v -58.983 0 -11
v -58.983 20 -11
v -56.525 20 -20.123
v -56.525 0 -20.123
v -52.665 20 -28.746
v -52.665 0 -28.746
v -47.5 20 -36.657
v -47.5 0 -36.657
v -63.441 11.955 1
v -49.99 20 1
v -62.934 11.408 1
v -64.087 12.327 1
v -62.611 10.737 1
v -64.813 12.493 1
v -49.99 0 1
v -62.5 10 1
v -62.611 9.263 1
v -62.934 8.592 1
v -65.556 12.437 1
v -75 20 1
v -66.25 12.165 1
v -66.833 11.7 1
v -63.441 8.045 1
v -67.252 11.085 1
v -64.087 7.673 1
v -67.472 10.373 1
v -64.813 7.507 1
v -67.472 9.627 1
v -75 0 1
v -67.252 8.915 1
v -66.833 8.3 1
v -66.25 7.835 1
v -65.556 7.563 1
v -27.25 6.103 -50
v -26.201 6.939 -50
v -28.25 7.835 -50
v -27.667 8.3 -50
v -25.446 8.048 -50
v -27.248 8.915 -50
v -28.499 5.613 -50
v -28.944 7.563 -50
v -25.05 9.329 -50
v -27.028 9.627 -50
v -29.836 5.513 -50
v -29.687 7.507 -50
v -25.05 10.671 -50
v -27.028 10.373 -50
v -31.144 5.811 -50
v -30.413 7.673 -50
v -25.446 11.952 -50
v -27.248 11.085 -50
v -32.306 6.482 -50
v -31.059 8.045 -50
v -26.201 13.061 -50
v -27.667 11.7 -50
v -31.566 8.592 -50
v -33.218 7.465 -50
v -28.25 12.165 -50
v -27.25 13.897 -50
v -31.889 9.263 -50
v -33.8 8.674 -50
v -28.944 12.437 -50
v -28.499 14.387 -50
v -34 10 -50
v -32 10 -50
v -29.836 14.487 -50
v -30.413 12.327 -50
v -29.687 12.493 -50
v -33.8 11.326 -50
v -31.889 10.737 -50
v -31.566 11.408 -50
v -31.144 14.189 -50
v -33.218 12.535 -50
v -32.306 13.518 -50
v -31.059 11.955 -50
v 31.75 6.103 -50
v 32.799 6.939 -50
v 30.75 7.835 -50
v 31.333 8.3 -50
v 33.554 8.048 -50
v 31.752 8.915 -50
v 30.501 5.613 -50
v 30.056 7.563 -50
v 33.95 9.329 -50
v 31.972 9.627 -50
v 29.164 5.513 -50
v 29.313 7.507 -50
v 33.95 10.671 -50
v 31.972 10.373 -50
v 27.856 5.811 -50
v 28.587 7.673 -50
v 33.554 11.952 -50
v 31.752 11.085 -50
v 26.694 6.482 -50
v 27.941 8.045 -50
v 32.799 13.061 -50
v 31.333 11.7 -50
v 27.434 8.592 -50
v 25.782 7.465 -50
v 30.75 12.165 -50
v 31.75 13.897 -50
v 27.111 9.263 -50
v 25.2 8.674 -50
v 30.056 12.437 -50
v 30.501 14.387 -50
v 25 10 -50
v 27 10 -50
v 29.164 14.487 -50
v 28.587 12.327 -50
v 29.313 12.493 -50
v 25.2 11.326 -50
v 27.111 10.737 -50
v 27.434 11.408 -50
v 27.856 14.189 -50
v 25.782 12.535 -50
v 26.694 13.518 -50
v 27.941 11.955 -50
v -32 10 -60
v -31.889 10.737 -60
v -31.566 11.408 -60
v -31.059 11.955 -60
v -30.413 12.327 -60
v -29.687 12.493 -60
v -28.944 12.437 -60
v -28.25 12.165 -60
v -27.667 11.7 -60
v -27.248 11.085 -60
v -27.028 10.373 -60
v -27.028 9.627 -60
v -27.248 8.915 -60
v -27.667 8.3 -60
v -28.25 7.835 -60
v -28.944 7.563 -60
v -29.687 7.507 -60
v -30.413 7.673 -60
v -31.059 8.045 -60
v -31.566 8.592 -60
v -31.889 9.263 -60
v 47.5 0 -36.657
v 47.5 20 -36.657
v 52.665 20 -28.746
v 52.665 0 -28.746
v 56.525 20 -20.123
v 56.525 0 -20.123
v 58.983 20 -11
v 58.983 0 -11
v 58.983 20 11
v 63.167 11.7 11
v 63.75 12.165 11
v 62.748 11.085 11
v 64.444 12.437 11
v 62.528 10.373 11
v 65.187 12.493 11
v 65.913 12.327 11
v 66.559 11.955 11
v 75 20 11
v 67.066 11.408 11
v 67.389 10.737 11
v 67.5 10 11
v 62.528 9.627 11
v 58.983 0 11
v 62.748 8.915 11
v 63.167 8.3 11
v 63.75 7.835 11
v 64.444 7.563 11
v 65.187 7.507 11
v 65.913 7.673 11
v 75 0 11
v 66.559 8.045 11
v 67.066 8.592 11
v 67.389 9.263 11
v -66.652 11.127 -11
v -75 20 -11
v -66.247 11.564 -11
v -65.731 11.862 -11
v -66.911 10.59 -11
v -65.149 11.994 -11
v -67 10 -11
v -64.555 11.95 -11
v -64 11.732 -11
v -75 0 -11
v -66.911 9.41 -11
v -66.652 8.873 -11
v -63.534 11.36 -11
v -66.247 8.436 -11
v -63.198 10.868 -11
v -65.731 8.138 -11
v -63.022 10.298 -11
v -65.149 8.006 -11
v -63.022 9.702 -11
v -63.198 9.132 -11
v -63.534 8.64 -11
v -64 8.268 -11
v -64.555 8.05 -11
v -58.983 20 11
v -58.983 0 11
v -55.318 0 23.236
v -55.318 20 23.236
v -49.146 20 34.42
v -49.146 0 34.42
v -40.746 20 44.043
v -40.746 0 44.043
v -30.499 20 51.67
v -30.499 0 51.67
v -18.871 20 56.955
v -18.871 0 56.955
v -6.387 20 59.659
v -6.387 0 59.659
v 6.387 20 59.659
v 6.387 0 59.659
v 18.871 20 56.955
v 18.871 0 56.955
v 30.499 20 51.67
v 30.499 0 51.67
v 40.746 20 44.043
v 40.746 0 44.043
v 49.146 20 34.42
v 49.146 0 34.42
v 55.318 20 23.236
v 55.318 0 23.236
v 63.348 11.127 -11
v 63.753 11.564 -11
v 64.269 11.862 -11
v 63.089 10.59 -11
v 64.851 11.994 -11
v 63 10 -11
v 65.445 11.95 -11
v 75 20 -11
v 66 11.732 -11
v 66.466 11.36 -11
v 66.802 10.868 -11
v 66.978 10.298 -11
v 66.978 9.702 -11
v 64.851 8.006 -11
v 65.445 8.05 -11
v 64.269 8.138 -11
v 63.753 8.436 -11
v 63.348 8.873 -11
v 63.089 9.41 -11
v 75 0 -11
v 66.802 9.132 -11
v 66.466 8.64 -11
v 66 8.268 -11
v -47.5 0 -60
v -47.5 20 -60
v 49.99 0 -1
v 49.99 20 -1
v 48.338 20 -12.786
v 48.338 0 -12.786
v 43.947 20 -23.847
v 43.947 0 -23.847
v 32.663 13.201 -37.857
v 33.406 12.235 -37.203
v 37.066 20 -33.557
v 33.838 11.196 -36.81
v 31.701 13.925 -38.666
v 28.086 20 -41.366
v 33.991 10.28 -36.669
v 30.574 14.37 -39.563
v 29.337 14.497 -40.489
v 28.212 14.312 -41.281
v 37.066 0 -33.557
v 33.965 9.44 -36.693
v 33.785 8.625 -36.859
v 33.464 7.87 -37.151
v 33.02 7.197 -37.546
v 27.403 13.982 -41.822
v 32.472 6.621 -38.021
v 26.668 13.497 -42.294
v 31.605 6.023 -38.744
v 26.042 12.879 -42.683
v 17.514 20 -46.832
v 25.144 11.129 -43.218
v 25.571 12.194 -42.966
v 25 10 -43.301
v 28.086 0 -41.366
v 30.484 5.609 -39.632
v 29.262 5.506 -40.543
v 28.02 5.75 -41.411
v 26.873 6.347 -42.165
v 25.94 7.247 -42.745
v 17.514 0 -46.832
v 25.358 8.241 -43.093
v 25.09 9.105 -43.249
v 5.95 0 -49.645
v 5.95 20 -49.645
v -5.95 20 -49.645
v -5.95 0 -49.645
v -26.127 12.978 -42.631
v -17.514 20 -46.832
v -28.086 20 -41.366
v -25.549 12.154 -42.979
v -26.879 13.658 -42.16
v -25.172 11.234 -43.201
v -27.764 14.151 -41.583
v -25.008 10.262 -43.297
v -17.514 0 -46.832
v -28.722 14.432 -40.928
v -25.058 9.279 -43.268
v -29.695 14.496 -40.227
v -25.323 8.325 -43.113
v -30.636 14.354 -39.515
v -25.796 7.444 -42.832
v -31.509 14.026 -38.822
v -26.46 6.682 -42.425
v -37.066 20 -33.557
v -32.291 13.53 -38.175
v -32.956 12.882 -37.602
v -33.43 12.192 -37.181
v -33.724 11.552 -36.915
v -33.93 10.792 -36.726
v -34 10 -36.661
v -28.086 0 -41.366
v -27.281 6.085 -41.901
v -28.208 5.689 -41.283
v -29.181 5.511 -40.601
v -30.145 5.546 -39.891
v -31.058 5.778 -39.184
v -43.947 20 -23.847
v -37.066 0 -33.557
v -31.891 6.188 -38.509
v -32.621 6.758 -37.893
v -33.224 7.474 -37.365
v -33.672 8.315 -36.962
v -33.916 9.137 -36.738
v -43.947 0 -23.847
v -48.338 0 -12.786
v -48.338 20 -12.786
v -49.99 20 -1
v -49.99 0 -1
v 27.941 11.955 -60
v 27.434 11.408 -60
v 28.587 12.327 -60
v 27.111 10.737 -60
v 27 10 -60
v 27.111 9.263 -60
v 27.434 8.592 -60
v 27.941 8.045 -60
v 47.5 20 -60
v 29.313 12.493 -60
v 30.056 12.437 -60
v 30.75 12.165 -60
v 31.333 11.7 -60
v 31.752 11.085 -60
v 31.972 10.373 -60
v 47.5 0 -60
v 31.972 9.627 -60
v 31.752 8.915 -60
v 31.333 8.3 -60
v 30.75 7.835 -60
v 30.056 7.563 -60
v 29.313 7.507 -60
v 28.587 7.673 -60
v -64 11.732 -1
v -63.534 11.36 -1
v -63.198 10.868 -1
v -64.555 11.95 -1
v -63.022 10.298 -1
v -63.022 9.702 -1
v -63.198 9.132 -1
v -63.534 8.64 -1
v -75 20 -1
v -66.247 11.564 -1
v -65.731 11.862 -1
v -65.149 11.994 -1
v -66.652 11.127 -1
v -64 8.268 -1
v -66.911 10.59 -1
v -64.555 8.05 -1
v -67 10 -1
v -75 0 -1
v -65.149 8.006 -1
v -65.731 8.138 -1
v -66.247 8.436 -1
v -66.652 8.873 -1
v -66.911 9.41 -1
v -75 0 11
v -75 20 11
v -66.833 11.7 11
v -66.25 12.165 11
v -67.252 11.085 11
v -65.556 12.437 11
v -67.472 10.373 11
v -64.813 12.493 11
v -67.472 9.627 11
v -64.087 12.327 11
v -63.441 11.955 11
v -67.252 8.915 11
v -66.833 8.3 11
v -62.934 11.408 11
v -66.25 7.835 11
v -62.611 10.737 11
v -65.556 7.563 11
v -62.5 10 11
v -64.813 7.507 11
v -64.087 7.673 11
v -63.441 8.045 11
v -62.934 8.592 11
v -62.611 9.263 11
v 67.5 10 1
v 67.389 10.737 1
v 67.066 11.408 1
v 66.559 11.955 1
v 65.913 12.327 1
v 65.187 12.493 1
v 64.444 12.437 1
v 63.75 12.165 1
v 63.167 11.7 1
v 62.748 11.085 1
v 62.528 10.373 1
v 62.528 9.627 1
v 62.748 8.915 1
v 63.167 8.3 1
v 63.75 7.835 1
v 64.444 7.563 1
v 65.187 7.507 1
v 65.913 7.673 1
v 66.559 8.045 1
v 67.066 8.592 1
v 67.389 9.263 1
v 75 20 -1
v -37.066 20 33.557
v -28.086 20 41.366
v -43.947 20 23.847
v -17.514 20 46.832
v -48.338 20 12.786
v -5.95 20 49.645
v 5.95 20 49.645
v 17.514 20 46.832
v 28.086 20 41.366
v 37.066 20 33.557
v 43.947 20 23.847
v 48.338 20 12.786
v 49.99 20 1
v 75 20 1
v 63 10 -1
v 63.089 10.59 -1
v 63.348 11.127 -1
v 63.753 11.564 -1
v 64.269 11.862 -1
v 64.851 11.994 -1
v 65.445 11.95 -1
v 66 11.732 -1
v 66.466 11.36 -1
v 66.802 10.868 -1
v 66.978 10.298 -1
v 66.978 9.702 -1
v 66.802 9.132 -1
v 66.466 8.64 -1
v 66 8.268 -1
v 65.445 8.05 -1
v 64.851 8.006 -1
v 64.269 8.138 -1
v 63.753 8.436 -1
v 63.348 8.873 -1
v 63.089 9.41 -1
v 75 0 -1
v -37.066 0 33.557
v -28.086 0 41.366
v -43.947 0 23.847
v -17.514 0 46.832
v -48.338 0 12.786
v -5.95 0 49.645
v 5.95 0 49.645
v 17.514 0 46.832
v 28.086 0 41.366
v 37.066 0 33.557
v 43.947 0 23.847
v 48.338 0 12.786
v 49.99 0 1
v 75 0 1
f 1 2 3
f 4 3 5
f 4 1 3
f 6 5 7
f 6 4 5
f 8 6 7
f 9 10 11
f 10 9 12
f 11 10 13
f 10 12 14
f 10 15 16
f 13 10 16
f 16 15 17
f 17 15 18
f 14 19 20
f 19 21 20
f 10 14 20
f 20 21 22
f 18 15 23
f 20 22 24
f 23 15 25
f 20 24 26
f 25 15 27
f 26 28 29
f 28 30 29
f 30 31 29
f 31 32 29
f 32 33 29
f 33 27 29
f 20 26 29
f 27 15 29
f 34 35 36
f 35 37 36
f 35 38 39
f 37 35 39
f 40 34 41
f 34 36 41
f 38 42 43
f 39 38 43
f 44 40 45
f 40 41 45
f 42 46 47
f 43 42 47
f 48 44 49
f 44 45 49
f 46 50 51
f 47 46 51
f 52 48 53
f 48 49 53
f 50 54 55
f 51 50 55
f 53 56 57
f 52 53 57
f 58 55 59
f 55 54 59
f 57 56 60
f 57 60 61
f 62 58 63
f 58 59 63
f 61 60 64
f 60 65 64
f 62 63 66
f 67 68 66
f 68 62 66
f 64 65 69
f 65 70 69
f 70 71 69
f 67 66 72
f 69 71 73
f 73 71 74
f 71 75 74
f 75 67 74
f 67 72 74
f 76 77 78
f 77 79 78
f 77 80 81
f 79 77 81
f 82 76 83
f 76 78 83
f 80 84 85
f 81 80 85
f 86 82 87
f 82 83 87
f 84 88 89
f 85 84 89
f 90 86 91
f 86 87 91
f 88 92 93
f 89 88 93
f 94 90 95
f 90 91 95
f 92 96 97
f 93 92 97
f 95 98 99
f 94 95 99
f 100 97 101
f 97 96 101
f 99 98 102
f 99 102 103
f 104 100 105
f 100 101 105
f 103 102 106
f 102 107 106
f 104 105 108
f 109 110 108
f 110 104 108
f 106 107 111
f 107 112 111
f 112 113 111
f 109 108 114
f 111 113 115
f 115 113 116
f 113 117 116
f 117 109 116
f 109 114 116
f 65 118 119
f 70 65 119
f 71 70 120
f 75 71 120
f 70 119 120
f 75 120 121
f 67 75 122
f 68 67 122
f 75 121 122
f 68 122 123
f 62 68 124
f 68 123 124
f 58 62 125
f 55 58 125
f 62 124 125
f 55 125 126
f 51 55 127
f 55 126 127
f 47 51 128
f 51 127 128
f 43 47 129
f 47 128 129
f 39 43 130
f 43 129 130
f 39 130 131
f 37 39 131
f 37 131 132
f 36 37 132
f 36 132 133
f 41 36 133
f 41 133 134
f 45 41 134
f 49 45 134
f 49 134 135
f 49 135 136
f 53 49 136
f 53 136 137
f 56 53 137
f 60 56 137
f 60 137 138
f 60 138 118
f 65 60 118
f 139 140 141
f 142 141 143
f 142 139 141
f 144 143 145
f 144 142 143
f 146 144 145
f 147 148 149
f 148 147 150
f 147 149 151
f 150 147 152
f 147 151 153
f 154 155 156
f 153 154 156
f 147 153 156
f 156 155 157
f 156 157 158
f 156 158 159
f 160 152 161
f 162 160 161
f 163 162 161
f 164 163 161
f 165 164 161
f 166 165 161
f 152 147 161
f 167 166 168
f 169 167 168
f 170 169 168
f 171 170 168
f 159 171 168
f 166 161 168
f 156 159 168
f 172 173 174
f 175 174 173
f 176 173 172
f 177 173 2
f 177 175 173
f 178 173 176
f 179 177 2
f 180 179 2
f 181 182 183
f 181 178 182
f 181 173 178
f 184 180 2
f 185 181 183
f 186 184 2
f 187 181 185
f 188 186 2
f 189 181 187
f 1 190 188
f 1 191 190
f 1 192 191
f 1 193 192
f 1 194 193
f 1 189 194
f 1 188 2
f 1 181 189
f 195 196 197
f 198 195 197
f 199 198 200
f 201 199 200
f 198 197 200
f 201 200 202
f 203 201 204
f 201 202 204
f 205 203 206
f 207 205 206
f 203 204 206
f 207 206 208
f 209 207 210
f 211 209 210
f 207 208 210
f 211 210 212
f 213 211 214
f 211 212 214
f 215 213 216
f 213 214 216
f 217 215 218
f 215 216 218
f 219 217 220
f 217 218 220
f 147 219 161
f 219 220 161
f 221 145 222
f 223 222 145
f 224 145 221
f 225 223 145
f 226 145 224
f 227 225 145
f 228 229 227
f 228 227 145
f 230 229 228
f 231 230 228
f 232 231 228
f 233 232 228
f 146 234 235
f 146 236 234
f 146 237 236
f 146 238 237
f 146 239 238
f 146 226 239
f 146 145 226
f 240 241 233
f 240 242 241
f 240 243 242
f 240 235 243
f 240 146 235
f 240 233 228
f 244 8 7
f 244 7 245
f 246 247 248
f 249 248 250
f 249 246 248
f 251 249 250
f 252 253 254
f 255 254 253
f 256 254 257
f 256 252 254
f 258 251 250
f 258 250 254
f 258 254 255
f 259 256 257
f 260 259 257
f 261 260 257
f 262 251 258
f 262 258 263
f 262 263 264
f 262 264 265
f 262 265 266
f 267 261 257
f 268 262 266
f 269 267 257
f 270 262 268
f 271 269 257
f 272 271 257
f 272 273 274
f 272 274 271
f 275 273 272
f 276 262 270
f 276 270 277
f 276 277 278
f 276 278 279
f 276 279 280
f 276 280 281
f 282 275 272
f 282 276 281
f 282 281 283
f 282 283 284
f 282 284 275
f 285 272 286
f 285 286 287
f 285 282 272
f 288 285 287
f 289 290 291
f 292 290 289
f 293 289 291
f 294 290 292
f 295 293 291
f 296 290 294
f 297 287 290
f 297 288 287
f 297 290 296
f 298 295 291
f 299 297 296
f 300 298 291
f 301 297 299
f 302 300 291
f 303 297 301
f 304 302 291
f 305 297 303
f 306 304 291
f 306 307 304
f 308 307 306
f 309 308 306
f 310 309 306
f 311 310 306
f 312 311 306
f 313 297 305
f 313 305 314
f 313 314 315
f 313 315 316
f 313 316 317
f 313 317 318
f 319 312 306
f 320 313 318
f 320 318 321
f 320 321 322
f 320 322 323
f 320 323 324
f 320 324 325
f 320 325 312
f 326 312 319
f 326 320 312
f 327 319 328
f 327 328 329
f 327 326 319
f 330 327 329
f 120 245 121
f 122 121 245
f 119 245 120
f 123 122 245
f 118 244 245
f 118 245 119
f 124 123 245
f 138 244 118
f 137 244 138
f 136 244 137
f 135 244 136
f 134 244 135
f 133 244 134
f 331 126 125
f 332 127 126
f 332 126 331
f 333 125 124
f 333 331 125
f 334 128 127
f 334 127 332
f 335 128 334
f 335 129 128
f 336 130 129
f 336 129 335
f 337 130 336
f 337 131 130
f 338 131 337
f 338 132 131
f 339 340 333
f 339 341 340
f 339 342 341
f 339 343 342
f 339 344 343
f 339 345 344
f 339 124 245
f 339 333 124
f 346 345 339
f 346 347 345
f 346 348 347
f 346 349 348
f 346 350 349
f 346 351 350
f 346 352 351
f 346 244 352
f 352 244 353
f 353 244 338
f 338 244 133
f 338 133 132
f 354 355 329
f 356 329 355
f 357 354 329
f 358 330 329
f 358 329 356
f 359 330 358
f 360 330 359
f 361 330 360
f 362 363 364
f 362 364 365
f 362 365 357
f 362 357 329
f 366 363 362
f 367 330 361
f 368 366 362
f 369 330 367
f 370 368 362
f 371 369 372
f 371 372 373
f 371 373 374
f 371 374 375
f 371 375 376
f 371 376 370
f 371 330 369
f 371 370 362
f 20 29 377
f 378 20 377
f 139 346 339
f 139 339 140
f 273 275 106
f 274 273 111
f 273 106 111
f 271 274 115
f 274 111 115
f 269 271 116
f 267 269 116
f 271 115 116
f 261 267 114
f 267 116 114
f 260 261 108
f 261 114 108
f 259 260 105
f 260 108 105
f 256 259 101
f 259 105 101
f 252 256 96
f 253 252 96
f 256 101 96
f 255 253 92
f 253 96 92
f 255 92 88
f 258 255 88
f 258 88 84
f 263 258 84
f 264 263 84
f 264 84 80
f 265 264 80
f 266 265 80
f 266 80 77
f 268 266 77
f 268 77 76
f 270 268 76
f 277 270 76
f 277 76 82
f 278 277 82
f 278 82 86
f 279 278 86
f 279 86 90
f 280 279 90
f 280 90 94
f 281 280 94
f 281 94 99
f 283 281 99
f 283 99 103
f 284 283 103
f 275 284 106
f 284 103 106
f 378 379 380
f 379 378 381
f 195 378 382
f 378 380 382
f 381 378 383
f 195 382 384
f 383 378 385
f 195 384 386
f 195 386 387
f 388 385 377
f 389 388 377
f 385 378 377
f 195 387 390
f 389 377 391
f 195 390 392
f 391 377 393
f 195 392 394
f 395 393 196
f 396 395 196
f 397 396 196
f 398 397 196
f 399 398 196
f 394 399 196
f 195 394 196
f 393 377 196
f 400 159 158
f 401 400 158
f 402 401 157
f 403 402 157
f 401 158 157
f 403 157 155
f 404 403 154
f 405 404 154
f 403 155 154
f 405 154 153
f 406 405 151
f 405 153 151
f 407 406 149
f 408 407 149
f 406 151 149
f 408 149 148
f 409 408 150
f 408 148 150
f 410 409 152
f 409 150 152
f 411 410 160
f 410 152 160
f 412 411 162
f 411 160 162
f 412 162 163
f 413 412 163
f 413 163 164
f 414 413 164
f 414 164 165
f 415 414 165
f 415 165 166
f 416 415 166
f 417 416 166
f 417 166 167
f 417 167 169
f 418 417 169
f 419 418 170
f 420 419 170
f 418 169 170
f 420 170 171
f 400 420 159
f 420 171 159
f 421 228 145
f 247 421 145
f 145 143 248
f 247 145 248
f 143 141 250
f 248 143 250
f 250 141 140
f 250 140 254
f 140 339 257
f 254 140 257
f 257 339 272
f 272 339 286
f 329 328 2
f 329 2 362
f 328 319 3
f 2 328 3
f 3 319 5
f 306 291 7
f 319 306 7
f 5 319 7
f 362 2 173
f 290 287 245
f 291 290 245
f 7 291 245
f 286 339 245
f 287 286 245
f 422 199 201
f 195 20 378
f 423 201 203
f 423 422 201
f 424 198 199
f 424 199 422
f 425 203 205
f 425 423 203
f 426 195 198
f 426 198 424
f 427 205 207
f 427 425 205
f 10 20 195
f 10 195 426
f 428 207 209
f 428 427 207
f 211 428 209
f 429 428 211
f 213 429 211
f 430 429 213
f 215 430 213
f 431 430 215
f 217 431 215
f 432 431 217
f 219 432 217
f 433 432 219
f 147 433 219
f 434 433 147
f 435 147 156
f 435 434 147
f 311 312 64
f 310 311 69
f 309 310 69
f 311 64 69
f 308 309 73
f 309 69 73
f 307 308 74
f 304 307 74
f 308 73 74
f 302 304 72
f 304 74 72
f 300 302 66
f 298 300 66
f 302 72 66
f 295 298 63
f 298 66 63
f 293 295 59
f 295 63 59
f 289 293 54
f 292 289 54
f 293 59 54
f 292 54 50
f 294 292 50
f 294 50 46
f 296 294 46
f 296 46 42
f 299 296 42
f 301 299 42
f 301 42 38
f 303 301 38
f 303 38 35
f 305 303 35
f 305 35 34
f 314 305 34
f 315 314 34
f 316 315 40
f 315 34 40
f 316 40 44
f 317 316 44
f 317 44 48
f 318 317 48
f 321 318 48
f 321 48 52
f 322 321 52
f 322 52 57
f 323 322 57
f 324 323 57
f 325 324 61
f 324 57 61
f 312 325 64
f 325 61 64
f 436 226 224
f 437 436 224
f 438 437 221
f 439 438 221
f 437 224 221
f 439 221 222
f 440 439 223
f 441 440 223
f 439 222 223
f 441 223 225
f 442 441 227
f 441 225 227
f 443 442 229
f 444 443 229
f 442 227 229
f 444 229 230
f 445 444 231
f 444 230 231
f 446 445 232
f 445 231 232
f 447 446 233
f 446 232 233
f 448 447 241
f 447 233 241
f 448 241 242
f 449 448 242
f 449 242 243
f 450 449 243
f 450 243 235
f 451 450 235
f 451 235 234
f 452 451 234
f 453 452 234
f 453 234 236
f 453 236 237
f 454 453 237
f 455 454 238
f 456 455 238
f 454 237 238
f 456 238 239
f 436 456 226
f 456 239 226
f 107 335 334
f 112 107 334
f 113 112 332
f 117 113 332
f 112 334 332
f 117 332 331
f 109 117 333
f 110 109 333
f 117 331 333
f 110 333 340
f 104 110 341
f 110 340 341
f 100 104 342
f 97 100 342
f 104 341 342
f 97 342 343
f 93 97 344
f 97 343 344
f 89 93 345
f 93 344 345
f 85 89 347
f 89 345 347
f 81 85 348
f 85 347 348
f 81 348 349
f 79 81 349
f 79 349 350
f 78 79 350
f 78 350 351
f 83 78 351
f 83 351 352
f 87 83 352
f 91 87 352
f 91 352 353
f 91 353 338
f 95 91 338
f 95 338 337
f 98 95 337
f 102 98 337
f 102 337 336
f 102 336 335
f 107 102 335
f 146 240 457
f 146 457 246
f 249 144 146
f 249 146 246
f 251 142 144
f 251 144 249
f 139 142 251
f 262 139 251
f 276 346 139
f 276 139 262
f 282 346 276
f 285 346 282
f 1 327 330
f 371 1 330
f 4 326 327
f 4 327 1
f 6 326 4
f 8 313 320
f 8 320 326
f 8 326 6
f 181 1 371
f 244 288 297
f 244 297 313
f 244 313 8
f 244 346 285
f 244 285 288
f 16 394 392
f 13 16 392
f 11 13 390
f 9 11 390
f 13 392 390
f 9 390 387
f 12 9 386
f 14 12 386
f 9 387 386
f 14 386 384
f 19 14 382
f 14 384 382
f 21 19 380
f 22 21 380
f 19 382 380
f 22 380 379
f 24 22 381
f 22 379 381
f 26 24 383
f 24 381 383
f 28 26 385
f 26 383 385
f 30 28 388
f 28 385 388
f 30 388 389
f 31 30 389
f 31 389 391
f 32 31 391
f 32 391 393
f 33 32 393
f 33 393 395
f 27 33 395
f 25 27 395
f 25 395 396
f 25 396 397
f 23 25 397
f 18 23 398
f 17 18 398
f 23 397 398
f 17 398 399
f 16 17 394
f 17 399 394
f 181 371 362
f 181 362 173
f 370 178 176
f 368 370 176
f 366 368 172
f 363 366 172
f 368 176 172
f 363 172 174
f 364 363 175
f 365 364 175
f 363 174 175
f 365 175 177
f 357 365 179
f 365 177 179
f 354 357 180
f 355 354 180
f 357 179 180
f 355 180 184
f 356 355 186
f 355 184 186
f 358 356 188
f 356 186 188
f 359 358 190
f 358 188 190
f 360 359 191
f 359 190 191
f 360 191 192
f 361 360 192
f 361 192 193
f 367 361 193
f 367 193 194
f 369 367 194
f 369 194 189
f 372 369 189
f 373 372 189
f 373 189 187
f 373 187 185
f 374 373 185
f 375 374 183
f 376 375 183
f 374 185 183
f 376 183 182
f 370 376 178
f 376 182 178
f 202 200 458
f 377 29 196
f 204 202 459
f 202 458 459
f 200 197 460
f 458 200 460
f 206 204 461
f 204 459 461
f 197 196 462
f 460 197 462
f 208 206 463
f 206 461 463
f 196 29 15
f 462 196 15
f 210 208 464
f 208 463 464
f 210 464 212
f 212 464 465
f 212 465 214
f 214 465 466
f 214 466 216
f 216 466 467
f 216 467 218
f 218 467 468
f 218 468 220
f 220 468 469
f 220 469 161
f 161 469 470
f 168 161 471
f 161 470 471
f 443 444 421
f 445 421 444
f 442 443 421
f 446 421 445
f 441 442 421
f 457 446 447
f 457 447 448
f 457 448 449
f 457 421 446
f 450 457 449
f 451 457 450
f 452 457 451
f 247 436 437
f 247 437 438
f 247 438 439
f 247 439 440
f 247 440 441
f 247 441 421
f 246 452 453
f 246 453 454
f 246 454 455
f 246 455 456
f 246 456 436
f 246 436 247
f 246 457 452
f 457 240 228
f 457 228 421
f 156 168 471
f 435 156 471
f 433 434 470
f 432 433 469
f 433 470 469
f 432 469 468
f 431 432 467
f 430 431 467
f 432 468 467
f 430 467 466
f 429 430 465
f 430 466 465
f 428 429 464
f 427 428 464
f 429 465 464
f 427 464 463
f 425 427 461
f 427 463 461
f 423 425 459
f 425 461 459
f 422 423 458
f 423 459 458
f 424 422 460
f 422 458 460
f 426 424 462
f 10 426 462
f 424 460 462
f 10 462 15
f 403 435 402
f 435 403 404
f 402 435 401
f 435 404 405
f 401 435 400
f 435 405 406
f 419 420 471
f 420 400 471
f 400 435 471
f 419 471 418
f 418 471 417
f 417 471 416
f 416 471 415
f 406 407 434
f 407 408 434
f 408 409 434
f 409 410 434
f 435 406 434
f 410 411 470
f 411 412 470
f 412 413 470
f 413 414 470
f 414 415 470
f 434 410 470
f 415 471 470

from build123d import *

# Parameters (mm, degrees)
BOSS_EXTRUDE1_DEPTH   = 20
BOSS_EXTRUDE1_2_DEPTH = 20
SKETCH2_R             = 2.5
CUT_EXTRUDE1_DEPTH    = 50
SKETCH4_R             = 4.5
CUT_EXTRUDE2_DEPTH    = 50
SKETCH5_R             = 2
CUT_EXTRUDE3_DEPTH    = 10
SKETCH6_R             = 2.5
CUT_EXTRUDE4_DEPTH    = 10


with BuildPart() as part:
    # Sketch1 → Boss-Extrude1 (new body)
    with BuildSketch(Plane(origin=(0, 0, 0), x_dir=(1, 0, 0), z_dir=(0, 1, 0))):
        with BuildLine():
            Line((-47.5, 60), (47.5, 60))
            Line((47.5, 60), (47.5, 36.657195747))
            ThreePointArc((47.5, 36.657195747), (54.765251969, 24.510552356), (58.983048412, 11))
            Line((58.983048412, 11), (75, 11))
            Line((75, 11), (75, 1))
            Line((75, 1), (49.989999, 1))
            ThreePointArc((49.989999, 1), (0, 50), (-49.989999, 1))
            Line((-49.989999, 1), (-75, 1))
            Line((-75, 1), (-75, 11))
            Line((-75, 11), (-58.983048412, 11))
            ThreePointArc((-58.983048412, 11), (-54.765251969, 24.510552356), (-47.5, 36.657195747))
            Line((-47.5, 36.657195747), (-47.5, 60))
        make_face()
    extrude(amount=BOSS_EXTRUDE1_DEPTH)

    # Sketch2 → Cut-Extrude1 (cut)
    with BuildSketch(Plane(origin=(0, 0, -60), x_dir=(-1, 0, 0), z_dir=(0, 0, -1))):
        with Locations((-29.5, 10)):
            Circle(SKETCH2_R)
        with Locations((29.5, 10)):
            Circle(SKETCH2_R)
    extrude(amount=-CUT_EXTRUDE1_DEPTH, mode=Mode.SUBTRACT)

    # Sketch4 → Cut-Extrude2 (cut)
    with BuildSketch(Plane(origin=(0, 0, -50), x_dir=(-1, 0, 0), z_dir=(0, 0, -1))):
        with Locations((-29.5, 10)):
            Circle(SKETCH4_R)
        with Locations((29.5, 10)):
            Circle(SKETCH4_R)
    extrude(amount=-CUT_EXTRUDE2_DEPTH, mode=Mode.SUBTRACT)

    # Sketch5 → Cut-Extrude3 (cut)
    with BuildSketch(Plane(origin=(0, 0, -11), x_dir=(-1, 0, 0), z_dir=(0, 0, -1))):
        with Locations((-65, 10)):
            Circle(SKETCH5_R)
        with Locations((65, 10)):
            Circle(SKETCH5_R)
    extrude(amount=-CUT_EXTRUDE3_DEPTH, mode=Mode.SUBTRACT)


with BuildPart() as body_2:
    # Sketch1 → Boss-Extrude1 2 (new body)
    with BuildSketch(Plane(origin=(0, 0, 0), x_dir=(1, 0, 0), z_dir=(0, 1, 0))):
        with BuildLine():
            Line((-75, -11), (-58.983048412, -11))
            ThreePointArc((-58.983048412, -11), (0, -60), (58.983048412, -11))
            Line((58.983048412, -11), (75, -11))
            Line((75, -11), (75, -1))
            Line((75, -1), (49.989999, -1))
            ThreePointArc((49.989999, -1), (0, -50), (-49.989999, -1))
            Line((-49.989999, -1), (-75, -1))
            Line((-75, -1), (-75, -11))
        make_face()
    extrude(amount=BOSS_EXTRUDE1_2_DEPTH)

    # Sketch6 → Cut-Extrude4 (cut)
    with BuildSketch(Plane.XY.offset(11)):
        with Locations((65, 10)):
            Circle(SKETCH6_R)
        with Locations((-65, 10)):
            Circle(SKETCH6_R)
    extrude(amount=-CUT_EXTRUDE4_DEPTH, mode=Mode.SUBTRACT)


solid = Compound([part.part, body_2.part])
